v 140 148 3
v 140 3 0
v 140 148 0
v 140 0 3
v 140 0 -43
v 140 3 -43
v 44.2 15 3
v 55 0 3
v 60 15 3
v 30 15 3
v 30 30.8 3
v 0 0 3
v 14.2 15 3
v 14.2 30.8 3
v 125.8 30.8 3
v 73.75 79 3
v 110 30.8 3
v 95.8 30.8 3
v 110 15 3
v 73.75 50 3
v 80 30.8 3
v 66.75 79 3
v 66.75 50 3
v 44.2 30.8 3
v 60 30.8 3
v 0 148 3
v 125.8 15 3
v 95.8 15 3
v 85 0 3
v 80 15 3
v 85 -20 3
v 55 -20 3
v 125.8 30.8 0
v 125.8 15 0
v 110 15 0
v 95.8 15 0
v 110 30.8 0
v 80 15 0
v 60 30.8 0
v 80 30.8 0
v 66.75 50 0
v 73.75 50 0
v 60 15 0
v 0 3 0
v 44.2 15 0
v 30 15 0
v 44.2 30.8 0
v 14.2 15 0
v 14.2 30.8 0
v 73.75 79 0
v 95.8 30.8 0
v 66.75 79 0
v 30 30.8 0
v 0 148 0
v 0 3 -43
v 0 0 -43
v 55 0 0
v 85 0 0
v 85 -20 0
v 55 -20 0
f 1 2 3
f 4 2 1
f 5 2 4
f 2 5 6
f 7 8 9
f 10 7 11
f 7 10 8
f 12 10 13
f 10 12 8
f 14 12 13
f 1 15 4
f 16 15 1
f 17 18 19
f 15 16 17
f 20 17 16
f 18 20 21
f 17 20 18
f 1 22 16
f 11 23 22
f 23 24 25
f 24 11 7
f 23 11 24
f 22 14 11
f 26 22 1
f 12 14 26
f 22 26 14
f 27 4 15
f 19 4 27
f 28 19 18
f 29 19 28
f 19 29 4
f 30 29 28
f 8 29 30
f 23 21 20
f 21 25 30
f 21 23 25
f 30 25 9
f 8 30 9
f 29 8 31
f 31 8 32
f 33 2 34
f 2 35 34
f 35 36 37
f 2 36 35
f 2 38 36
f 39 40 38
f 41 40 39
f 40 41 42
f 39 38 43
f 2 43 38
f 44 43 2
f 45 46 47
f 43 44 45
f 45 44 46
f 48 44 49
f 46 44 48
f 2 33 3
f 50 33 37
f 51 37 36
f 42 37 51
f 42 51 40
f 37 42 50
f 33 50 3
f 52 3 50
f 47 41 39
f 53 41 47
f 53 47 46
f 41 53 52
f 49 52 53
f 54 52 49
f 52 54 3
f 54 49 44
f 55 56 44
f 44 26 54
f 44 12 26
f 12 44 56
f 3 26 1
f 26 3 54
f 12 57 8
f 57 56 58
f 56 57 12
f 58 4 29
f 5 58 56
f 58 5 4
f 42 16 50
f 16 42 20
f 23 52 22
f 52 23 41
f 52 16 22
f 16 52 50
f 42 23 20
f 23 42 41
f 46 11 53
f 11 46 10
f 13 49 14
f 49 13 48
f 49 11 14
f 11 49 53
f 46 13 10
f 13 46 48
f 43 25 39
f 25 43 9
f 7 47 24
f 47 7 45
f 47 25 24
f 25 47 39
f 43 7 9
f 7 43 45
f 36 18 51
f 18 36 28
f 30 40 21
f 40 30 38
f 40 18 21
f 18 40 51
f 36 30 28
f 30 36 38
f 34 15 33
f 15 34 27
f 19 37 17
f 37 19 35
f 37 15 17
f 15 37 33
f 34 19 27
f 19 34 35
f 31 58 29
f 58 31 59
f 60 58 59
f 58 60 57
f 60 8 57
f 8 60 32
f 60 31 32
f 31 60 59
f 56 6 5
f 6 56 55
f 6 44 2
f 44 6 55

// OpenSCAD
/*
        ENAMEL PROJECT - MELANIE BALJKO
        MODELLING FOR VERSION 2
        CREATED BY: SHWETA DIXIT - 2017
        
        TITLE --- VERSION 2 - TOP LID SLIDER 
        
        (Measurements in mm)
        
*/

// Modelling the top lid slider
module slider_layer()
{
    
    difference()
    {
        cube([140, 148, 3]);  
    
        // Adding a hole for the braille cell
        translate([66.75, 50, 0])
        {
            cube([7, 29, 3]);
        }
        
        // Adding hole for button 1
        translate([14.2, 15, 0])
        {
            cube([15.8, 15.8, 3]);
        }
        
        // Adding hole for button 2
        translate([44.2, 15, 0])
        {
            cube([15.8, 15.8, 3]);
        }
        
        // Adding hole for button 3
        translate([80, 15, 0])
        {
            cube([15.8, 15.8, 3]);
        }
        
        // Adding hole for button 4
        translate([110, 15, 0])
        {
            cube([15.8, 15.8, 3]);
        }
    }
    
    // Adding the handle
    translate([55, -20, 0])
    {
        cube([30, 20, 3]);
    }
    
    // Adding the bottom closing area
    translate([0, 0, -43])
    {
        cube([140, 3 ,43]);
    }
}
slider_layer();
